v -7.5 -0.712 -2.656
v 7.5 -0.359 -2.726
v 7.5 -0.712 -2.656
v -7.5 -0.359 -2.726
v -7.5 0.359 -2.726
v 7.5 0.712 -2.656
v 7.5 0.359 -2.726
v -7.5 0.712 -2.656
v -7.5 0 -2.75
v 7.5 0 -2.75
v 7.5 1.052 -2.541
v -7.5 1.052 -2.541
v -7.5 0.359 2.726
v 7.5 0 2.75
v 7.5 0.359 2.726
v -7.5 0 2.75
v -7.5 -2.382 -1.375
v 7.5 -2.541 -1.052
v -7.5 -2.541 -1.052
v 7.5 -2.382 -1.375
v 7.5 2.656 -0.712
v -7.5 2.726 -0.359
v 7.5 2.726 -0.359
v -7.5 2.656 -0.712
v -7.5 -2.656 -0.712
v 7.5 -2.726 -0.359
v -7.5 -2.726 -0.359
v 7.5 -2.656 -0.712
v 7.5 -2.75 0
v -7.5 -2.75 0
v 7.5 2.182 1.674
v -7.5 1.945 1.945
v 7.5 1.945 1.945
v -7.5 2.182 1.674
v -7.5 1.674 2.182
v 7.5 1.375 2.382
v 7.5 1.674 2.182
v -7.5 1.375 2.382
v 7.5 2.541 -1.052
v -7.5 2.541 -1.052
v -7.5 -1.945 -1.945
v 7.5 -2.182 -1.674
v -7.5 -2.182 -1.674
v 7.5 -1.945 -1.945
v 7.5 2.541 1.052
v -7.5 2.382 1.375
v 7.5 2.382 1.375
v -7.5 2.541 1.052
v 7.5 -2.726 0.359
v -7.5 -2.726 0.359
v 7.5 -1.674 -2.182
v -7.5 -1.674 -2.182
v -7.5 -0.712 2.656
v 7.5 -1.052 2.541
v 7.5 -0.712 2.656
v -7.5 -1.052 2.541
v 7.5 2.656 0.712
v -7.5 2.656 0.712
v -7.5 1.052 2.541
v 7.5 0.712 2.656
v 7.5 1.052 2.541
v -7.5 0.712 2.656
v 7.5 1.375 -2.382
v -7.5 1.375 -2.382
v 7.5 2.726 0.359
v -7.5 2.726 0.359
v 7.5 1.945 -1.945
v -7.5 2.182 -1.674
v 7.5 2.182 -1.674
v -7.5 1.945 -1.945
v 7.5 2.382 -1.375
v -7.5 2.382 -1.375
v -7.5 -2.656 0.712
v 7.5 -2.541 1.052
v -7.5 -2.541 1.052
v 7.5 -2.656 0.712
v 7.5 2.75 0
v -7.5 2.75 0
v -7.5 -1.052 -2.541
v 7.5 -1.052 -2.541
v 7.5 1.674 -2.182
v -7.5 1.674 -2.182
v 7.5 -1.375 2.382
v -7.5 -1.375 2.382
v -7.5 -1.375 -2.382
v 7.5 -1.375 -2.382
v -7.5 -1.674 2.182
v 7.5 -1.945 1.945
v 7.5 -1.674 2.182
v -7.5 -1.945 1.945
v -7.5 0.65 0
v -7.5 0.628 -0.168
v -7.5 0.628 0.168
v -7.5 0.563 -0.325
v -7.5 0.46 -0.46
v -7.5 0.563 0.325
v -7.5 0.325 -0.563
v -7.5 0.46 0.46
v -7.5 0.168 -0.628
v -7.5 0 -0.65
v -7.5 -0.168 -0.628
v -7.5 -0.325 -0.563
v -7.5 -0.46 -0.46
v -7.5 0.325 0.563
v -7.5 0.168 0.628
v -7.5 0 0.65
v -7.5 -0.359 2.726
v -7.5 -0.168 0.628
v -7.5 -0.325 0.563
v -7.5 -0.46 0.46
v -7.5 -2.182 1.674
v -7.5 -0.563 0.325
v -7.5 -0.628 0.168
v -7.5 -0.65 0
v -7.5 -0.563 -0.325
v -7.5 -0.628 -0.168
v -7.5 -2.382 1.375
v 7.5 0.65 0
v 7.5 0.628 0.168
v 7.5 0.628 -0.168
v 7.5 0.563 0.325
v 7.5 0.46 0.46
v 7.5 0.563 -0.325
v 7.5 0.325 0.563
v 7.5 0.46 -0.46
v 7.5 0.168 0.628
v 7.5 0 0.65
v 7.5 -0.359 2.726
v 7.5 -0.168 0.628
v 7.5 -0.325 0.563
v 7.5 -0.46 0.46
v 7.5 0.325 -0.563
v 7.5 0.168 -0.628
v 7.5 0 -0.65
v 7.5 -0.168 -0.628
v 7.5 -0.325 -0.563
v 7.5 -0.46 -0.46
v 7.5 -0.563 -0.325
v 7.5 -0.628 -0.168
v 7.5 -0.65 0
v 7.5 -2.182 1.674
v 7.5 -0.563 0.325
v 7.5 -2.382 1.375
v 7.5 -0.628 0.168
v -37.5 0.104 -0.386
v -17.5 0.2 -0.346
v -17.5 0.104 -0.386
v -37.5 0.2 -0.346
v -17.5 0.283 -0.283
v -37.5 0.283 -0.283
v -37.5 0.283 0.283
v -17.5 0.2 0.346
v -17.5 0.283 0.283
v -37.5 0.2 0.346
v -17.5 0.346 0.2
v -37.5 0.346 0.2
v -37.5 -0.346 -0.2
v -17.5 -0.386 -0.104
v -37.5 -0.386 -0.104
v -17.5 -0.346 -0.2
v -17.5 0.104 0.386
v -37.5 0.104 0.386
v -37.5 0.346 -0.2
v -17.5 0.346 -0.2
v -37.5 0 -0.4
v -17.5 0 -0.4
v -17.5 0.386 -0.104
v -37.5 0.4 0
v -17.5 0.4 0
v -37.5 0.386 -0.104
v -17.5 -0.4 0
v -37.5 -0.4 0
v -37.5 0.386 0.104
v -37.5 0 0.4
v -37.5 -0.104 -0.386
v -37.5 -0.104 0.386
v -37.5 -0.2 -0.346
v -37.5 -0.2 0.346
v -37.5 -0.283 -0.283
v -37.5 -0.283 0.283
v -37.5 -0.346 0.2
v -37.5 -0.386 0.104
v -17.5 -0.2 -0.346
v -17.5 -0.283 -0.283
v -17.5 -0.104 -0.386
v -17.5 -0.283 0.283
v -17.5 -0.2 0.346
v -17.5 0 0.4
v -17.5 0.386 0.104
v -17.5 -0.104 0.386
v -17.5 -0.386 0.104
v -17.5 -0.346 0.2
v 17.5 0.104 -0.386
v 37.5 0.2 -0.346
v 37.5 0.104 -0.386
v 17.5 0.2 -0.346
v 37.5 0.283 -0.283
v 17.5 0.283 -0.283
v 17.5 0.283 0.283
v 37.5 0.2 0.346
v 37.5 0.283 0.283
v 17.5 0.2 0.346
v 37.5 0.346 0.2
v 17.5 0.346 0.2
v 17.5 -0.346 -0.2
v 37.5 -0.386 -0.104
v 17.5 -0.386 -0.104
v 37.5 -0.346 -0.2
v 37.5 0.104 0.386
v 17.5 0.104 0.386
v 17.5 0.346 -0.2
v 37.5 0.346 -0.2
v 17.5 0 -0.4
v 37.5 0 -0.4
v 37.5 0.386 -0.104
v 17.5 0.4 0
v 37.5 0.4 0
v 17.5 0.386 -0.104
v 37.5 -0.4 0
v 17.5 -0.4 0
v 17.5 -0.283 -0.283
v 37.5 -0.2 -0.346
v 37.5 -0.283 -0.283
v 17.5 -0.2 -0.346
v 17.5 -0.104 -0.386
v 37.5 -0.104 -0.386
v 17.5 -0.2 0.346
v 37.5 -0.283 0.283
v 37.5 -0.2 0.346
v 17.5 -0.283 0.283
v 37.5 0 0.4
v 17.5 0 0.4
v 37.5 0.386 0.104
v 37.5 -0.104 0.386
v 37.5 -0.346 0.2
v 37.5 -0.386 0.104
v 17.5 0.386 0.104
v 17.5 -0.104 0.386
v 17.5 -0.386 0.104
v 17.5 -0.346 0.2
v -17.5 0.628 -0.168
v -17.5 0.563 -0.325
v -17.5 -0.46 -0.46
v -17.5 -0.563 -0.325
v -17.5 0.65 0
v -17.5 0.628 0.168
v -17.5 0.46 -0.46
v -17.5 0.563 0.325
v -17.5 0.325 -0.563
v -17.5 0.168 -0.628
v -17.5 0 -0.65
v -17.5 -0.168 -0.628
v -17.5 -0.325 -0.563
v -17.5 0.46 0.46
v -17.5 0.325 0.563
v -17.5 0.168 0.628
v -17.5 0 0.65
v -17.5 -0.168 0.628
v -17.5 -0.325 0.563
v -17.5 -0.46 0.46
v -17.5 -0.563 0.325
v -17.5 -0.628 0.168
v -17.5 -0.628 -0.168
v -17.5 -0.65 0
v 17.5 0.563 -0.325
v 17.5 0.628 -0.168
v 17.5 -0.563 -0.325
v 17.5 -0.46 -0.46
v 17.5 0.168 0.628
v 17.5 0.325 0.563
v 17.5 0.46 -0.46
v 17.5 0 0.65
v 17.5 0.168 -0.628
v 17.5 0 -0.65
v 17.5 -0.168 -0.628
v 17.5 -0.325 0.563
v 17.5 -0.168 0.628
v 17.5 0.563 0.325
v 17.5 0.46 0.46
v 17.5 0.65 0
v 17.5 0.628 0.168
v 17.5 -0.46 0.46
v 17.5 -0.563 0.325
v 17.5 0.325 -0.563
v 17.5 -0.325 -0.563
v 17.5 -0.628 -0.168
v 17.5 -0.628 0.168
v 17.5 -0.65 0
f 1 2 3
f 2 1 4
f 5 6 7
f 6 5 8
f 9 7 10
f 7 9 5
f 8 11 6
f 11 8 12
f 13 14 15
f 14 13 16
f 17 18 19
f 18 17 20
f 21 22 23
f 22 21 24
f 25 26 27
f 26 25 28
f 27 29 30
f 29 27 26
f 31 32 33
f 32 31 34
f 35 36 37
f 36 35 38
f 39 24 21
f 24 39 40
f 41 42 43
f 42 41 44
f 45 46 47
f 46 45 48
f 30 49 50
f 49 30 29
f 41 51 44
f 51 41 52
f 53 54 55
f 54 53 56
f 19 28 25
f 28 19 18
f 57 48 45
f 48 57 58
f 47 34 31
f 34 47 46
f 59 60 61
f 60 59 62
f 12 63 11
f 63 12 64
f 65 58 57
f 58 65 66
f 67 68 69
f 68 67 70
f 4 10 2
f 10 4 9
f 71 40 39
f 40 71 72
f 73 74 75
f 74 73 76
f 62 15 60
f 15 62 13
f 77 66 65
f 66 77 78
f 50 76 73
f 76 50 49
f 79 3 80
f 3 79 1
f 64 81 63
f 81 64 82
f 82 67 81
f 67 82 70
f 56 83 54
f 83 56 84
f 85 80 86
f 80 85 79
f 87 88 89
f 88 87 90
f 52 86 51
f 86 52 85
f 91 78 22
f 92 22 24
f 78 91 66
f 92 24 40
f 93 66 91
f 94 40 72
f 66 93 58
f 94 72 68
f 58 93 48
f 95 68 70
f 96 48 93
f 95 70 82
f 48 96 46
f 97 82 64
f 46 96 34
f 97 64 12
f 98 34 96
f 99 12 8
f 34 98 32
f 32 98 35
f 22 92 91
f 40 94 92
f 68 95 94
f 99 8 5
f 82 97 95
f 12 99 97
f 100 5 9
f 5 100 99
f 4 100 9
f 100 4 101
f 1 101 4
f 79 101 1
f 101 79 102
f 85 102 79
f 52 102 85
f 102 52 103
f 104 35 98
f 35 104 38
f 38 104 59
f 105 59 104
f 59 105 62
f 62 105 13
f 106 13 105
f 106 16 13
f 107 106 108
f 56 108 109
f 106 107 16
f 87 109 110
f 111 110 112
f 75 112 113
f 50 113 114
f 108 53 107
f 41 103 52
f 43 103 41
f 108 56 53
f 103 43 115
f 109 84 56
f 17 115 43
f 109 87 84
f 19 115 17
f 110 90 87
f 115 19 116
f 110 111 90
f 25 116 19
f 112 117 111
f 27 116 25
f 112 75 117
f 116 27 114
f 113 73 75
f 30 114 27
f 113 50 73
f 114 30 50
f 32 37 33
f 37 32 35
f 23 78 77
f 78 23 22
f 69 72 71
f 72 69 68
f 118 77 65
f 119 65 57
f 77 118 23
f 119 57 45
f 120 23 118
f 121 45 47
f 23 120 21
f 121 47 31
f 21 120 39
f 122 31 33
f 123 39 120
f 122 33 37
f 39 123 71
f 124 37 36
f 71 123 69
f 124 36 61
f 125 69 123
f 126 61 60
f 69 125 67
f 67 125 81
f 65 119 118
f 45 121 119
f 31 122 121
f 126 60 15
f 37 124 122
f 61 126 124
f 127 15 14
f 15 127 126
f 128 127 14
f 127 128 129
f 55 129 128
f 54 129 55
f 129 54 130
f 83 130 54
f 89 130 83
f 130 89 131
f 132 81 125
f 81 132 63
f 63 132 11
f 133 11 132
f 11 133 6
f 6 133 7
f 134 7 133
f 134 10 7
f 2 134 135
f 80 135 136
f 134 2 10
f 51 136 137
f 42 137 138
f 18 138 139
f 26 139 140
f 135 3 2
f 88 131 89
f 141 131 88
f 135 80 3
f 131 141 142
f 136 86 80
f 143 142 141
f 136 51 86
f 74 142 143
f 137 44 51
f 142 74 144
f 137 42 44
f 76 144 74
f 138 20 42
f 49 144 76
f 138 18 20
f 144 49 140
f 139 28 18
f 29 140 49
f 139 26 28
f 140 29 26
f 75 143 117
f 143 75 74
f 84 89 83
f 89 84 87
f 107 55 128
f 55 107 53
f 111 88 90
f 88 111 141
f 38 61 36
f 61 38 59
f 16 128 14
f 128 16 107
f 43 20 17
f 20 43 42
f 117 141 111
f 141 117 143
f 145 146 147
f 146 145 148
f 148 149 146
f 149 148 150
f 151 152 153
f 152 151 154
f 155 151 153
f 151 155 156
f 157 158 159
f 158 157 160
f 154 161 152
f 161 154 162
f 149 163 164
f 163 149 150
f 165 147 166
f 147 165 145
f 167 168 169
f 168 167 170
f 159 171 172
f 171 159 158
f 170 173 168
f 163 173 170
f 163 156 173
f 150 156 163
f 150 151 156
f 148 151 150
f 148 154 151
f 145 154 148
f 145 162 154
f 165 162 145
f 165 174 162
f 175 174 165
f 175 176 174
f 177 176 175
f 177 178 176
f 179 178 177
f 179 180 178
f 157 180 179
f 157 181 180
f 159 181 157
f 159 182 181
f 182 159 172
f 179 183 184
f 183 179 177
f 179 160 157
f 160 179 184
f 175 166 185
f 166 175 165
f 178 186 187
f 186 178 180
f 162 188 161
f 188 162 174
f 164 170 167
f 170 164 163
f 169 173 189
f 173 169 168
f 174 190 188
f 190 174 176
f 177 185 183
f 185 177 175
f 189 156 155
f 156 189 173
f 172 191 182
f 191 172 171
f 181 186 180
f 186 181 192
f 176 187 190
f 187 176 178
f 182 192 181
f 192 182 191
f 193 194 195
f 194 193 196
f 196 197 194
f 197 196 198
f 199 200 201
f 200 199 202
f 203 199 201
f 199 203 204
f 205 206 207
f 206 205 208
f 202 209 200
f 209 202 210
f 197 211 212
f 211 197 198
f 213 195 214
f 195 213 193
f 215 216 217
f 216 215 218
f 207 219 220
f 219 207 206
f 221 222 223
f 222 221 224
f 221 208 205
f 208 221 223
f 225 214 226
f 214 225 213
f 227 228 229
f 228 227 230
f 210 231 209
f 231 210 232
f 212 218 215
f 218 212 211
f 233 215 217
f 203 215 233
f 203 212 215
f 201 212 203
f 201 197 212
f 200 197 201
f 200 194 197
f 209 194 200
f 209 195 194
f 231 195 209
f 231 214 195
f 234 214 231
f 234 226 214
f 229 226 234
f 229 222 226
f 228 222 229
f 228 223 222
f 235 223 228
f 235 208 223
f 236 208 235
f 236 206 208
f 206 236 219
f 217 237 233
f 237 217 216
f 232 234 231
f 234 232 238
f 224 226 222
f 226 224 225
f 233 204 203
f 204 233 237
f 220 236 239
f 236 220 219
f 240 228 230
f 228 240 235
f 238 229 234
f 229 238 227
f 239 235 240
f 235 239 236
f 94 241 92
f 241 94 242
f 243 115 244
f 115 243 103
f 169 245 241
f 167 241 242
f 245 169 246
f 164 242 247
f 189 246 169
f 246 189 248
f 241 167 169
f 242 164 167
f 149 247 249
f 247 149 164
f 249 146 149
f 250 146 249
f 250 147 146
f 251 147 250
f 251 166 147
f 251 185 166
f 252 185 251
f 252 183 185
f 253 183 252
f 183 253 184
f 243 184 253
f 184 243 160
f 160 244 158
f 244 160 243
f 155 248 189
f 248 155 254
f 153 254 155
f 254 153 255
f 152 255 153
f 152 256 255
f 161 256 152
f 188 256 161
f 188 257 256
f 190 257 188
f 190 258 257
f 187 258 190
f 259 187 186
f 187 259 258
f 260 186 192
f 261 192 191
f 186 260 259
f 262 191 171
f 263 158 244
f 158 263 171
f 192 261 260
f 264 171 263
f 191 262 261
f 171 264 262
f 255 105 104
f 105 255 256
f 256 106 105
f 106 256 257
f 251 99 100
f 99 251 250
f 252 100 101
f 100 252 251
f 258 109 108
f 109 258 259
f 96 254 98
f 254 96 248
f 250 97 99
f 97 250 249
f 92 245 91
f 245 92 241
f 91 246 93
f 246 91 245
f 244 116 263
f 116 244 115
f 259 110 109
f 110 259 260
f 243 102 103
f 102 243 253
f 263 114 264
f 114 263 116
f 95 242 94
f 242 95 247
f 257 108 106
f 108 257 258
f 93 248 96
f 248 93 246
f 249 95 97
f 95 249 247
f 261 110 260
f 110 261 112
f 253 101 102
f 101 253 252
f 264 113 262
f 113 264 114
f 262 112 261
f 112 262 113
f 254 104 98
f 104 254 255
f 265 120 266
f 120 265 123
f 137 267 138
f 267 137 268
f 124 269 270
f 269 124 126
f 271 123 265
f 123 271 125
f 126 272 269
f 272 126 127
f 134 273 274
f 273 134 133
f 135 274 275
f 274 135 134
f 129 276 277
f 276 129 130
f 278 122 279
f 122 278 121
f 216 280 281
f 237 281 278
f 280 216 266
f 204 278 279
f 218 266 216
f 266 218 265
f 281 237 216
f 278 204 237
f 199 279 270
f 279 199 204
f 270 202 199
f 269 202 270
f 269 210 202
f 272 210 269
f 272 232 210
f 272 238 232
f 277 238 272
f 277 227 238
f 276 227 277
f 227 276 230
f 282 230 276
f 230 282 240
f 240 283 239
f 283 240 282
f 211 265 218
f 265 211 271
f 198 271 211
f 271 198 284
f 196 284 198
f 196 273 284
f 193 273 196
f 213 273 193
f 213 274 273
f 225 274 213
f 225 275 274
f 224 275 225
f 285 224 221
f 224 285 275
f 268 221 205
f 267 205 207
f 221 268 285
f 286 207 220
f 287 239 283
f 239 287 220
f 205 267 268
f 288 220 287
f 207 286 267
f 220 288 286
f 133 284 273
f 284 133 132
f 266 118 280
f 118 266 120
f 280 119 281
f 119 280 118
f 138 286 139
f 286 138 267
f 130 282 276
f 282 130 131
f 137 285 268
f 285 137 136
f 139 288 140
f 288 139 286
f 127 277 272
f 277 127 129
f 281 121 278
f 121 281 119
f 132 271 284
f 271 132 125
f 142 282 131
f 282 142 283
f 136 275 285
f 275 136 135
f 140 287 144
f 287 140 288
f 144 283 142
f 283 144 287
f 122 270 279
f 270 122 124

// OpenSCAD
// Parameters
resistance_ohms = 6.8; //[3.4:13.6:0.1]
power_w = 3; //[1.5:6:0.5]
body_length_mm = 15; //[8:30:1]
body_diameter_mm = 5.5; //[3:11:0.1]
enamel_thickness_mm = 0.4; //[0.2:0.8:0.05]
lead_diameter_mm = 0.8; //[0.4:1.6:0.05]
lead_length_each_mm = 30; //[15:60:1]
lead_overlap_mm = 1; //[0.5:2:0.1]
sleeve_length_each_mm = 10; //[0:25:1]
sleeve_thickness_mm = 0.25; //[0.1:0.6:0.05]
eps_mm = 0.01; //[0.001:0.1:0.001]

// Connectivity overlap (force solid intersections between parts)
connect_overlap_mm = 1.5; // 1-2mm recommended

// ---------- Single connected resistor geometry ----------
module resistor_connected() {
  // Derived
  body_r = body_diameter_mm/2;
  core_r = max(0.01, body_r - enamel_thickness_mm);

  // Ensure overlap is at least 1mm and not longer than the lead itself
  overlap = min(max(connect_overlap_mm, 1), lead_length_each_mm);

  // Body extents along X (body cylinder is along Z by default, so rotate it to X)
  // We'll build everything along X to avoid axis confusion and guarantee attachment.
  body_half = body_length_mm/2;

  // Leads: place so inner end penetrates into body by 'overlap'
  // For a centered X-axis cylinder of length L at x=cx:
  // left end = cx - L/2, right end = cx + L/2
  lead_L = lead_length_each_mm + overlap; // extra length ensures penetration robustness

  // Left lead: its right end should be at (-body_half + overlap)
  left_lead_cx  = (-body_half + overlap) - lead_L/2;

  // Right lead: its left end should be at ( body_half - overlap)
  right_lead_cx = ( body_half - overlap) + lead_L/2;

  // Sleeves: must overlap into body/lead region too (and be on top of the lead)
  sleeve_L = max(0, sleeve_length_each_mm);
  sleeve_L_eff = (sleeve_L > 0) ? (sleeve_L + overlap) : 0;

  // Left sleeve: its right end should be at (-body_half + overlap)
  left_sleeve_cx  = (-body_half + overlap) - sleeve_L_eff/2;

  // Right sleeve: its left end should be at ( body_half - overlap)
  right_sleeve_cx = ( body_half - overlap) + sleeve_L_eff/2;

  union() {
    // Resistor body (core + enamel) oriented along X so leads attach correctly
    union() {
      // Core (grey cylinder) - physically present and unioned
      color("DimGray")
        rotate([0, 90, 0])
          cylinder(r=core_r, h=body_length_mm, center=true, $fn=48);

      // Enamel coating (white shell) - unioned with core (touching at core surface)
      color("White")
        rotate([0, 90, 0])
          difference() {
            cylinder(r=body_r, h=body_length_mm, center=true, $fn=48);
            cylinder(r=core_r, h=body_length_mm + eps_mm, center=true, $fn=48);
          }
    }

    // Leads (silver) - forced overlap into body
    color("Silver") {
      translate([left_lead_cx, 0, 0])
        rotate([0, 90, 0])
          cylinder(r=lead_diameter_mm/2, h=lead_L, center=true, $fn=24);

      translate([right_lead_cx, 0, 0])
        rotate([0, 90, 0])
          cylinder(r=lead_diameter_mm/2, h=lead_L, center=true, $fn=24);
    }

    // Sleeves (black) - forced overlap into body/lead region
    if (sleeve_L > 0) {
      color("Black") {
        translate([left_sleeve_cx, 0, 0])
          rotate([0, 90, 0])
            cylinder(r=lead_diameter_mm/2 + sleeve_thickness_mm, h=sleeve_L_eff, center=true, $fn=24);

        translate([right_sleeve_cx, 0, 0])
          rotate([0, 90, 0])
            cylinder(r=lead_diameter_mm/2 + sleeve_thickness_mm, h=sleeve_L_eff, center=true, $fn=24);
      }
    }
  }
}

// Backwards-compatible module names (all now produce the same single connected solid)
module resistor() { resistor_connected(); }
module al_clad_resistor() { resistor_connected(); }
module sleeved_resistor() { resistor_connected(); }
module al_clad_resistor_assembly() { resistor_connected(); }

// Assembly: union into a single solid (no stacked duplicates)
module assembly() {
  union() {
    resistor_connected();
  }
}

assembly();
